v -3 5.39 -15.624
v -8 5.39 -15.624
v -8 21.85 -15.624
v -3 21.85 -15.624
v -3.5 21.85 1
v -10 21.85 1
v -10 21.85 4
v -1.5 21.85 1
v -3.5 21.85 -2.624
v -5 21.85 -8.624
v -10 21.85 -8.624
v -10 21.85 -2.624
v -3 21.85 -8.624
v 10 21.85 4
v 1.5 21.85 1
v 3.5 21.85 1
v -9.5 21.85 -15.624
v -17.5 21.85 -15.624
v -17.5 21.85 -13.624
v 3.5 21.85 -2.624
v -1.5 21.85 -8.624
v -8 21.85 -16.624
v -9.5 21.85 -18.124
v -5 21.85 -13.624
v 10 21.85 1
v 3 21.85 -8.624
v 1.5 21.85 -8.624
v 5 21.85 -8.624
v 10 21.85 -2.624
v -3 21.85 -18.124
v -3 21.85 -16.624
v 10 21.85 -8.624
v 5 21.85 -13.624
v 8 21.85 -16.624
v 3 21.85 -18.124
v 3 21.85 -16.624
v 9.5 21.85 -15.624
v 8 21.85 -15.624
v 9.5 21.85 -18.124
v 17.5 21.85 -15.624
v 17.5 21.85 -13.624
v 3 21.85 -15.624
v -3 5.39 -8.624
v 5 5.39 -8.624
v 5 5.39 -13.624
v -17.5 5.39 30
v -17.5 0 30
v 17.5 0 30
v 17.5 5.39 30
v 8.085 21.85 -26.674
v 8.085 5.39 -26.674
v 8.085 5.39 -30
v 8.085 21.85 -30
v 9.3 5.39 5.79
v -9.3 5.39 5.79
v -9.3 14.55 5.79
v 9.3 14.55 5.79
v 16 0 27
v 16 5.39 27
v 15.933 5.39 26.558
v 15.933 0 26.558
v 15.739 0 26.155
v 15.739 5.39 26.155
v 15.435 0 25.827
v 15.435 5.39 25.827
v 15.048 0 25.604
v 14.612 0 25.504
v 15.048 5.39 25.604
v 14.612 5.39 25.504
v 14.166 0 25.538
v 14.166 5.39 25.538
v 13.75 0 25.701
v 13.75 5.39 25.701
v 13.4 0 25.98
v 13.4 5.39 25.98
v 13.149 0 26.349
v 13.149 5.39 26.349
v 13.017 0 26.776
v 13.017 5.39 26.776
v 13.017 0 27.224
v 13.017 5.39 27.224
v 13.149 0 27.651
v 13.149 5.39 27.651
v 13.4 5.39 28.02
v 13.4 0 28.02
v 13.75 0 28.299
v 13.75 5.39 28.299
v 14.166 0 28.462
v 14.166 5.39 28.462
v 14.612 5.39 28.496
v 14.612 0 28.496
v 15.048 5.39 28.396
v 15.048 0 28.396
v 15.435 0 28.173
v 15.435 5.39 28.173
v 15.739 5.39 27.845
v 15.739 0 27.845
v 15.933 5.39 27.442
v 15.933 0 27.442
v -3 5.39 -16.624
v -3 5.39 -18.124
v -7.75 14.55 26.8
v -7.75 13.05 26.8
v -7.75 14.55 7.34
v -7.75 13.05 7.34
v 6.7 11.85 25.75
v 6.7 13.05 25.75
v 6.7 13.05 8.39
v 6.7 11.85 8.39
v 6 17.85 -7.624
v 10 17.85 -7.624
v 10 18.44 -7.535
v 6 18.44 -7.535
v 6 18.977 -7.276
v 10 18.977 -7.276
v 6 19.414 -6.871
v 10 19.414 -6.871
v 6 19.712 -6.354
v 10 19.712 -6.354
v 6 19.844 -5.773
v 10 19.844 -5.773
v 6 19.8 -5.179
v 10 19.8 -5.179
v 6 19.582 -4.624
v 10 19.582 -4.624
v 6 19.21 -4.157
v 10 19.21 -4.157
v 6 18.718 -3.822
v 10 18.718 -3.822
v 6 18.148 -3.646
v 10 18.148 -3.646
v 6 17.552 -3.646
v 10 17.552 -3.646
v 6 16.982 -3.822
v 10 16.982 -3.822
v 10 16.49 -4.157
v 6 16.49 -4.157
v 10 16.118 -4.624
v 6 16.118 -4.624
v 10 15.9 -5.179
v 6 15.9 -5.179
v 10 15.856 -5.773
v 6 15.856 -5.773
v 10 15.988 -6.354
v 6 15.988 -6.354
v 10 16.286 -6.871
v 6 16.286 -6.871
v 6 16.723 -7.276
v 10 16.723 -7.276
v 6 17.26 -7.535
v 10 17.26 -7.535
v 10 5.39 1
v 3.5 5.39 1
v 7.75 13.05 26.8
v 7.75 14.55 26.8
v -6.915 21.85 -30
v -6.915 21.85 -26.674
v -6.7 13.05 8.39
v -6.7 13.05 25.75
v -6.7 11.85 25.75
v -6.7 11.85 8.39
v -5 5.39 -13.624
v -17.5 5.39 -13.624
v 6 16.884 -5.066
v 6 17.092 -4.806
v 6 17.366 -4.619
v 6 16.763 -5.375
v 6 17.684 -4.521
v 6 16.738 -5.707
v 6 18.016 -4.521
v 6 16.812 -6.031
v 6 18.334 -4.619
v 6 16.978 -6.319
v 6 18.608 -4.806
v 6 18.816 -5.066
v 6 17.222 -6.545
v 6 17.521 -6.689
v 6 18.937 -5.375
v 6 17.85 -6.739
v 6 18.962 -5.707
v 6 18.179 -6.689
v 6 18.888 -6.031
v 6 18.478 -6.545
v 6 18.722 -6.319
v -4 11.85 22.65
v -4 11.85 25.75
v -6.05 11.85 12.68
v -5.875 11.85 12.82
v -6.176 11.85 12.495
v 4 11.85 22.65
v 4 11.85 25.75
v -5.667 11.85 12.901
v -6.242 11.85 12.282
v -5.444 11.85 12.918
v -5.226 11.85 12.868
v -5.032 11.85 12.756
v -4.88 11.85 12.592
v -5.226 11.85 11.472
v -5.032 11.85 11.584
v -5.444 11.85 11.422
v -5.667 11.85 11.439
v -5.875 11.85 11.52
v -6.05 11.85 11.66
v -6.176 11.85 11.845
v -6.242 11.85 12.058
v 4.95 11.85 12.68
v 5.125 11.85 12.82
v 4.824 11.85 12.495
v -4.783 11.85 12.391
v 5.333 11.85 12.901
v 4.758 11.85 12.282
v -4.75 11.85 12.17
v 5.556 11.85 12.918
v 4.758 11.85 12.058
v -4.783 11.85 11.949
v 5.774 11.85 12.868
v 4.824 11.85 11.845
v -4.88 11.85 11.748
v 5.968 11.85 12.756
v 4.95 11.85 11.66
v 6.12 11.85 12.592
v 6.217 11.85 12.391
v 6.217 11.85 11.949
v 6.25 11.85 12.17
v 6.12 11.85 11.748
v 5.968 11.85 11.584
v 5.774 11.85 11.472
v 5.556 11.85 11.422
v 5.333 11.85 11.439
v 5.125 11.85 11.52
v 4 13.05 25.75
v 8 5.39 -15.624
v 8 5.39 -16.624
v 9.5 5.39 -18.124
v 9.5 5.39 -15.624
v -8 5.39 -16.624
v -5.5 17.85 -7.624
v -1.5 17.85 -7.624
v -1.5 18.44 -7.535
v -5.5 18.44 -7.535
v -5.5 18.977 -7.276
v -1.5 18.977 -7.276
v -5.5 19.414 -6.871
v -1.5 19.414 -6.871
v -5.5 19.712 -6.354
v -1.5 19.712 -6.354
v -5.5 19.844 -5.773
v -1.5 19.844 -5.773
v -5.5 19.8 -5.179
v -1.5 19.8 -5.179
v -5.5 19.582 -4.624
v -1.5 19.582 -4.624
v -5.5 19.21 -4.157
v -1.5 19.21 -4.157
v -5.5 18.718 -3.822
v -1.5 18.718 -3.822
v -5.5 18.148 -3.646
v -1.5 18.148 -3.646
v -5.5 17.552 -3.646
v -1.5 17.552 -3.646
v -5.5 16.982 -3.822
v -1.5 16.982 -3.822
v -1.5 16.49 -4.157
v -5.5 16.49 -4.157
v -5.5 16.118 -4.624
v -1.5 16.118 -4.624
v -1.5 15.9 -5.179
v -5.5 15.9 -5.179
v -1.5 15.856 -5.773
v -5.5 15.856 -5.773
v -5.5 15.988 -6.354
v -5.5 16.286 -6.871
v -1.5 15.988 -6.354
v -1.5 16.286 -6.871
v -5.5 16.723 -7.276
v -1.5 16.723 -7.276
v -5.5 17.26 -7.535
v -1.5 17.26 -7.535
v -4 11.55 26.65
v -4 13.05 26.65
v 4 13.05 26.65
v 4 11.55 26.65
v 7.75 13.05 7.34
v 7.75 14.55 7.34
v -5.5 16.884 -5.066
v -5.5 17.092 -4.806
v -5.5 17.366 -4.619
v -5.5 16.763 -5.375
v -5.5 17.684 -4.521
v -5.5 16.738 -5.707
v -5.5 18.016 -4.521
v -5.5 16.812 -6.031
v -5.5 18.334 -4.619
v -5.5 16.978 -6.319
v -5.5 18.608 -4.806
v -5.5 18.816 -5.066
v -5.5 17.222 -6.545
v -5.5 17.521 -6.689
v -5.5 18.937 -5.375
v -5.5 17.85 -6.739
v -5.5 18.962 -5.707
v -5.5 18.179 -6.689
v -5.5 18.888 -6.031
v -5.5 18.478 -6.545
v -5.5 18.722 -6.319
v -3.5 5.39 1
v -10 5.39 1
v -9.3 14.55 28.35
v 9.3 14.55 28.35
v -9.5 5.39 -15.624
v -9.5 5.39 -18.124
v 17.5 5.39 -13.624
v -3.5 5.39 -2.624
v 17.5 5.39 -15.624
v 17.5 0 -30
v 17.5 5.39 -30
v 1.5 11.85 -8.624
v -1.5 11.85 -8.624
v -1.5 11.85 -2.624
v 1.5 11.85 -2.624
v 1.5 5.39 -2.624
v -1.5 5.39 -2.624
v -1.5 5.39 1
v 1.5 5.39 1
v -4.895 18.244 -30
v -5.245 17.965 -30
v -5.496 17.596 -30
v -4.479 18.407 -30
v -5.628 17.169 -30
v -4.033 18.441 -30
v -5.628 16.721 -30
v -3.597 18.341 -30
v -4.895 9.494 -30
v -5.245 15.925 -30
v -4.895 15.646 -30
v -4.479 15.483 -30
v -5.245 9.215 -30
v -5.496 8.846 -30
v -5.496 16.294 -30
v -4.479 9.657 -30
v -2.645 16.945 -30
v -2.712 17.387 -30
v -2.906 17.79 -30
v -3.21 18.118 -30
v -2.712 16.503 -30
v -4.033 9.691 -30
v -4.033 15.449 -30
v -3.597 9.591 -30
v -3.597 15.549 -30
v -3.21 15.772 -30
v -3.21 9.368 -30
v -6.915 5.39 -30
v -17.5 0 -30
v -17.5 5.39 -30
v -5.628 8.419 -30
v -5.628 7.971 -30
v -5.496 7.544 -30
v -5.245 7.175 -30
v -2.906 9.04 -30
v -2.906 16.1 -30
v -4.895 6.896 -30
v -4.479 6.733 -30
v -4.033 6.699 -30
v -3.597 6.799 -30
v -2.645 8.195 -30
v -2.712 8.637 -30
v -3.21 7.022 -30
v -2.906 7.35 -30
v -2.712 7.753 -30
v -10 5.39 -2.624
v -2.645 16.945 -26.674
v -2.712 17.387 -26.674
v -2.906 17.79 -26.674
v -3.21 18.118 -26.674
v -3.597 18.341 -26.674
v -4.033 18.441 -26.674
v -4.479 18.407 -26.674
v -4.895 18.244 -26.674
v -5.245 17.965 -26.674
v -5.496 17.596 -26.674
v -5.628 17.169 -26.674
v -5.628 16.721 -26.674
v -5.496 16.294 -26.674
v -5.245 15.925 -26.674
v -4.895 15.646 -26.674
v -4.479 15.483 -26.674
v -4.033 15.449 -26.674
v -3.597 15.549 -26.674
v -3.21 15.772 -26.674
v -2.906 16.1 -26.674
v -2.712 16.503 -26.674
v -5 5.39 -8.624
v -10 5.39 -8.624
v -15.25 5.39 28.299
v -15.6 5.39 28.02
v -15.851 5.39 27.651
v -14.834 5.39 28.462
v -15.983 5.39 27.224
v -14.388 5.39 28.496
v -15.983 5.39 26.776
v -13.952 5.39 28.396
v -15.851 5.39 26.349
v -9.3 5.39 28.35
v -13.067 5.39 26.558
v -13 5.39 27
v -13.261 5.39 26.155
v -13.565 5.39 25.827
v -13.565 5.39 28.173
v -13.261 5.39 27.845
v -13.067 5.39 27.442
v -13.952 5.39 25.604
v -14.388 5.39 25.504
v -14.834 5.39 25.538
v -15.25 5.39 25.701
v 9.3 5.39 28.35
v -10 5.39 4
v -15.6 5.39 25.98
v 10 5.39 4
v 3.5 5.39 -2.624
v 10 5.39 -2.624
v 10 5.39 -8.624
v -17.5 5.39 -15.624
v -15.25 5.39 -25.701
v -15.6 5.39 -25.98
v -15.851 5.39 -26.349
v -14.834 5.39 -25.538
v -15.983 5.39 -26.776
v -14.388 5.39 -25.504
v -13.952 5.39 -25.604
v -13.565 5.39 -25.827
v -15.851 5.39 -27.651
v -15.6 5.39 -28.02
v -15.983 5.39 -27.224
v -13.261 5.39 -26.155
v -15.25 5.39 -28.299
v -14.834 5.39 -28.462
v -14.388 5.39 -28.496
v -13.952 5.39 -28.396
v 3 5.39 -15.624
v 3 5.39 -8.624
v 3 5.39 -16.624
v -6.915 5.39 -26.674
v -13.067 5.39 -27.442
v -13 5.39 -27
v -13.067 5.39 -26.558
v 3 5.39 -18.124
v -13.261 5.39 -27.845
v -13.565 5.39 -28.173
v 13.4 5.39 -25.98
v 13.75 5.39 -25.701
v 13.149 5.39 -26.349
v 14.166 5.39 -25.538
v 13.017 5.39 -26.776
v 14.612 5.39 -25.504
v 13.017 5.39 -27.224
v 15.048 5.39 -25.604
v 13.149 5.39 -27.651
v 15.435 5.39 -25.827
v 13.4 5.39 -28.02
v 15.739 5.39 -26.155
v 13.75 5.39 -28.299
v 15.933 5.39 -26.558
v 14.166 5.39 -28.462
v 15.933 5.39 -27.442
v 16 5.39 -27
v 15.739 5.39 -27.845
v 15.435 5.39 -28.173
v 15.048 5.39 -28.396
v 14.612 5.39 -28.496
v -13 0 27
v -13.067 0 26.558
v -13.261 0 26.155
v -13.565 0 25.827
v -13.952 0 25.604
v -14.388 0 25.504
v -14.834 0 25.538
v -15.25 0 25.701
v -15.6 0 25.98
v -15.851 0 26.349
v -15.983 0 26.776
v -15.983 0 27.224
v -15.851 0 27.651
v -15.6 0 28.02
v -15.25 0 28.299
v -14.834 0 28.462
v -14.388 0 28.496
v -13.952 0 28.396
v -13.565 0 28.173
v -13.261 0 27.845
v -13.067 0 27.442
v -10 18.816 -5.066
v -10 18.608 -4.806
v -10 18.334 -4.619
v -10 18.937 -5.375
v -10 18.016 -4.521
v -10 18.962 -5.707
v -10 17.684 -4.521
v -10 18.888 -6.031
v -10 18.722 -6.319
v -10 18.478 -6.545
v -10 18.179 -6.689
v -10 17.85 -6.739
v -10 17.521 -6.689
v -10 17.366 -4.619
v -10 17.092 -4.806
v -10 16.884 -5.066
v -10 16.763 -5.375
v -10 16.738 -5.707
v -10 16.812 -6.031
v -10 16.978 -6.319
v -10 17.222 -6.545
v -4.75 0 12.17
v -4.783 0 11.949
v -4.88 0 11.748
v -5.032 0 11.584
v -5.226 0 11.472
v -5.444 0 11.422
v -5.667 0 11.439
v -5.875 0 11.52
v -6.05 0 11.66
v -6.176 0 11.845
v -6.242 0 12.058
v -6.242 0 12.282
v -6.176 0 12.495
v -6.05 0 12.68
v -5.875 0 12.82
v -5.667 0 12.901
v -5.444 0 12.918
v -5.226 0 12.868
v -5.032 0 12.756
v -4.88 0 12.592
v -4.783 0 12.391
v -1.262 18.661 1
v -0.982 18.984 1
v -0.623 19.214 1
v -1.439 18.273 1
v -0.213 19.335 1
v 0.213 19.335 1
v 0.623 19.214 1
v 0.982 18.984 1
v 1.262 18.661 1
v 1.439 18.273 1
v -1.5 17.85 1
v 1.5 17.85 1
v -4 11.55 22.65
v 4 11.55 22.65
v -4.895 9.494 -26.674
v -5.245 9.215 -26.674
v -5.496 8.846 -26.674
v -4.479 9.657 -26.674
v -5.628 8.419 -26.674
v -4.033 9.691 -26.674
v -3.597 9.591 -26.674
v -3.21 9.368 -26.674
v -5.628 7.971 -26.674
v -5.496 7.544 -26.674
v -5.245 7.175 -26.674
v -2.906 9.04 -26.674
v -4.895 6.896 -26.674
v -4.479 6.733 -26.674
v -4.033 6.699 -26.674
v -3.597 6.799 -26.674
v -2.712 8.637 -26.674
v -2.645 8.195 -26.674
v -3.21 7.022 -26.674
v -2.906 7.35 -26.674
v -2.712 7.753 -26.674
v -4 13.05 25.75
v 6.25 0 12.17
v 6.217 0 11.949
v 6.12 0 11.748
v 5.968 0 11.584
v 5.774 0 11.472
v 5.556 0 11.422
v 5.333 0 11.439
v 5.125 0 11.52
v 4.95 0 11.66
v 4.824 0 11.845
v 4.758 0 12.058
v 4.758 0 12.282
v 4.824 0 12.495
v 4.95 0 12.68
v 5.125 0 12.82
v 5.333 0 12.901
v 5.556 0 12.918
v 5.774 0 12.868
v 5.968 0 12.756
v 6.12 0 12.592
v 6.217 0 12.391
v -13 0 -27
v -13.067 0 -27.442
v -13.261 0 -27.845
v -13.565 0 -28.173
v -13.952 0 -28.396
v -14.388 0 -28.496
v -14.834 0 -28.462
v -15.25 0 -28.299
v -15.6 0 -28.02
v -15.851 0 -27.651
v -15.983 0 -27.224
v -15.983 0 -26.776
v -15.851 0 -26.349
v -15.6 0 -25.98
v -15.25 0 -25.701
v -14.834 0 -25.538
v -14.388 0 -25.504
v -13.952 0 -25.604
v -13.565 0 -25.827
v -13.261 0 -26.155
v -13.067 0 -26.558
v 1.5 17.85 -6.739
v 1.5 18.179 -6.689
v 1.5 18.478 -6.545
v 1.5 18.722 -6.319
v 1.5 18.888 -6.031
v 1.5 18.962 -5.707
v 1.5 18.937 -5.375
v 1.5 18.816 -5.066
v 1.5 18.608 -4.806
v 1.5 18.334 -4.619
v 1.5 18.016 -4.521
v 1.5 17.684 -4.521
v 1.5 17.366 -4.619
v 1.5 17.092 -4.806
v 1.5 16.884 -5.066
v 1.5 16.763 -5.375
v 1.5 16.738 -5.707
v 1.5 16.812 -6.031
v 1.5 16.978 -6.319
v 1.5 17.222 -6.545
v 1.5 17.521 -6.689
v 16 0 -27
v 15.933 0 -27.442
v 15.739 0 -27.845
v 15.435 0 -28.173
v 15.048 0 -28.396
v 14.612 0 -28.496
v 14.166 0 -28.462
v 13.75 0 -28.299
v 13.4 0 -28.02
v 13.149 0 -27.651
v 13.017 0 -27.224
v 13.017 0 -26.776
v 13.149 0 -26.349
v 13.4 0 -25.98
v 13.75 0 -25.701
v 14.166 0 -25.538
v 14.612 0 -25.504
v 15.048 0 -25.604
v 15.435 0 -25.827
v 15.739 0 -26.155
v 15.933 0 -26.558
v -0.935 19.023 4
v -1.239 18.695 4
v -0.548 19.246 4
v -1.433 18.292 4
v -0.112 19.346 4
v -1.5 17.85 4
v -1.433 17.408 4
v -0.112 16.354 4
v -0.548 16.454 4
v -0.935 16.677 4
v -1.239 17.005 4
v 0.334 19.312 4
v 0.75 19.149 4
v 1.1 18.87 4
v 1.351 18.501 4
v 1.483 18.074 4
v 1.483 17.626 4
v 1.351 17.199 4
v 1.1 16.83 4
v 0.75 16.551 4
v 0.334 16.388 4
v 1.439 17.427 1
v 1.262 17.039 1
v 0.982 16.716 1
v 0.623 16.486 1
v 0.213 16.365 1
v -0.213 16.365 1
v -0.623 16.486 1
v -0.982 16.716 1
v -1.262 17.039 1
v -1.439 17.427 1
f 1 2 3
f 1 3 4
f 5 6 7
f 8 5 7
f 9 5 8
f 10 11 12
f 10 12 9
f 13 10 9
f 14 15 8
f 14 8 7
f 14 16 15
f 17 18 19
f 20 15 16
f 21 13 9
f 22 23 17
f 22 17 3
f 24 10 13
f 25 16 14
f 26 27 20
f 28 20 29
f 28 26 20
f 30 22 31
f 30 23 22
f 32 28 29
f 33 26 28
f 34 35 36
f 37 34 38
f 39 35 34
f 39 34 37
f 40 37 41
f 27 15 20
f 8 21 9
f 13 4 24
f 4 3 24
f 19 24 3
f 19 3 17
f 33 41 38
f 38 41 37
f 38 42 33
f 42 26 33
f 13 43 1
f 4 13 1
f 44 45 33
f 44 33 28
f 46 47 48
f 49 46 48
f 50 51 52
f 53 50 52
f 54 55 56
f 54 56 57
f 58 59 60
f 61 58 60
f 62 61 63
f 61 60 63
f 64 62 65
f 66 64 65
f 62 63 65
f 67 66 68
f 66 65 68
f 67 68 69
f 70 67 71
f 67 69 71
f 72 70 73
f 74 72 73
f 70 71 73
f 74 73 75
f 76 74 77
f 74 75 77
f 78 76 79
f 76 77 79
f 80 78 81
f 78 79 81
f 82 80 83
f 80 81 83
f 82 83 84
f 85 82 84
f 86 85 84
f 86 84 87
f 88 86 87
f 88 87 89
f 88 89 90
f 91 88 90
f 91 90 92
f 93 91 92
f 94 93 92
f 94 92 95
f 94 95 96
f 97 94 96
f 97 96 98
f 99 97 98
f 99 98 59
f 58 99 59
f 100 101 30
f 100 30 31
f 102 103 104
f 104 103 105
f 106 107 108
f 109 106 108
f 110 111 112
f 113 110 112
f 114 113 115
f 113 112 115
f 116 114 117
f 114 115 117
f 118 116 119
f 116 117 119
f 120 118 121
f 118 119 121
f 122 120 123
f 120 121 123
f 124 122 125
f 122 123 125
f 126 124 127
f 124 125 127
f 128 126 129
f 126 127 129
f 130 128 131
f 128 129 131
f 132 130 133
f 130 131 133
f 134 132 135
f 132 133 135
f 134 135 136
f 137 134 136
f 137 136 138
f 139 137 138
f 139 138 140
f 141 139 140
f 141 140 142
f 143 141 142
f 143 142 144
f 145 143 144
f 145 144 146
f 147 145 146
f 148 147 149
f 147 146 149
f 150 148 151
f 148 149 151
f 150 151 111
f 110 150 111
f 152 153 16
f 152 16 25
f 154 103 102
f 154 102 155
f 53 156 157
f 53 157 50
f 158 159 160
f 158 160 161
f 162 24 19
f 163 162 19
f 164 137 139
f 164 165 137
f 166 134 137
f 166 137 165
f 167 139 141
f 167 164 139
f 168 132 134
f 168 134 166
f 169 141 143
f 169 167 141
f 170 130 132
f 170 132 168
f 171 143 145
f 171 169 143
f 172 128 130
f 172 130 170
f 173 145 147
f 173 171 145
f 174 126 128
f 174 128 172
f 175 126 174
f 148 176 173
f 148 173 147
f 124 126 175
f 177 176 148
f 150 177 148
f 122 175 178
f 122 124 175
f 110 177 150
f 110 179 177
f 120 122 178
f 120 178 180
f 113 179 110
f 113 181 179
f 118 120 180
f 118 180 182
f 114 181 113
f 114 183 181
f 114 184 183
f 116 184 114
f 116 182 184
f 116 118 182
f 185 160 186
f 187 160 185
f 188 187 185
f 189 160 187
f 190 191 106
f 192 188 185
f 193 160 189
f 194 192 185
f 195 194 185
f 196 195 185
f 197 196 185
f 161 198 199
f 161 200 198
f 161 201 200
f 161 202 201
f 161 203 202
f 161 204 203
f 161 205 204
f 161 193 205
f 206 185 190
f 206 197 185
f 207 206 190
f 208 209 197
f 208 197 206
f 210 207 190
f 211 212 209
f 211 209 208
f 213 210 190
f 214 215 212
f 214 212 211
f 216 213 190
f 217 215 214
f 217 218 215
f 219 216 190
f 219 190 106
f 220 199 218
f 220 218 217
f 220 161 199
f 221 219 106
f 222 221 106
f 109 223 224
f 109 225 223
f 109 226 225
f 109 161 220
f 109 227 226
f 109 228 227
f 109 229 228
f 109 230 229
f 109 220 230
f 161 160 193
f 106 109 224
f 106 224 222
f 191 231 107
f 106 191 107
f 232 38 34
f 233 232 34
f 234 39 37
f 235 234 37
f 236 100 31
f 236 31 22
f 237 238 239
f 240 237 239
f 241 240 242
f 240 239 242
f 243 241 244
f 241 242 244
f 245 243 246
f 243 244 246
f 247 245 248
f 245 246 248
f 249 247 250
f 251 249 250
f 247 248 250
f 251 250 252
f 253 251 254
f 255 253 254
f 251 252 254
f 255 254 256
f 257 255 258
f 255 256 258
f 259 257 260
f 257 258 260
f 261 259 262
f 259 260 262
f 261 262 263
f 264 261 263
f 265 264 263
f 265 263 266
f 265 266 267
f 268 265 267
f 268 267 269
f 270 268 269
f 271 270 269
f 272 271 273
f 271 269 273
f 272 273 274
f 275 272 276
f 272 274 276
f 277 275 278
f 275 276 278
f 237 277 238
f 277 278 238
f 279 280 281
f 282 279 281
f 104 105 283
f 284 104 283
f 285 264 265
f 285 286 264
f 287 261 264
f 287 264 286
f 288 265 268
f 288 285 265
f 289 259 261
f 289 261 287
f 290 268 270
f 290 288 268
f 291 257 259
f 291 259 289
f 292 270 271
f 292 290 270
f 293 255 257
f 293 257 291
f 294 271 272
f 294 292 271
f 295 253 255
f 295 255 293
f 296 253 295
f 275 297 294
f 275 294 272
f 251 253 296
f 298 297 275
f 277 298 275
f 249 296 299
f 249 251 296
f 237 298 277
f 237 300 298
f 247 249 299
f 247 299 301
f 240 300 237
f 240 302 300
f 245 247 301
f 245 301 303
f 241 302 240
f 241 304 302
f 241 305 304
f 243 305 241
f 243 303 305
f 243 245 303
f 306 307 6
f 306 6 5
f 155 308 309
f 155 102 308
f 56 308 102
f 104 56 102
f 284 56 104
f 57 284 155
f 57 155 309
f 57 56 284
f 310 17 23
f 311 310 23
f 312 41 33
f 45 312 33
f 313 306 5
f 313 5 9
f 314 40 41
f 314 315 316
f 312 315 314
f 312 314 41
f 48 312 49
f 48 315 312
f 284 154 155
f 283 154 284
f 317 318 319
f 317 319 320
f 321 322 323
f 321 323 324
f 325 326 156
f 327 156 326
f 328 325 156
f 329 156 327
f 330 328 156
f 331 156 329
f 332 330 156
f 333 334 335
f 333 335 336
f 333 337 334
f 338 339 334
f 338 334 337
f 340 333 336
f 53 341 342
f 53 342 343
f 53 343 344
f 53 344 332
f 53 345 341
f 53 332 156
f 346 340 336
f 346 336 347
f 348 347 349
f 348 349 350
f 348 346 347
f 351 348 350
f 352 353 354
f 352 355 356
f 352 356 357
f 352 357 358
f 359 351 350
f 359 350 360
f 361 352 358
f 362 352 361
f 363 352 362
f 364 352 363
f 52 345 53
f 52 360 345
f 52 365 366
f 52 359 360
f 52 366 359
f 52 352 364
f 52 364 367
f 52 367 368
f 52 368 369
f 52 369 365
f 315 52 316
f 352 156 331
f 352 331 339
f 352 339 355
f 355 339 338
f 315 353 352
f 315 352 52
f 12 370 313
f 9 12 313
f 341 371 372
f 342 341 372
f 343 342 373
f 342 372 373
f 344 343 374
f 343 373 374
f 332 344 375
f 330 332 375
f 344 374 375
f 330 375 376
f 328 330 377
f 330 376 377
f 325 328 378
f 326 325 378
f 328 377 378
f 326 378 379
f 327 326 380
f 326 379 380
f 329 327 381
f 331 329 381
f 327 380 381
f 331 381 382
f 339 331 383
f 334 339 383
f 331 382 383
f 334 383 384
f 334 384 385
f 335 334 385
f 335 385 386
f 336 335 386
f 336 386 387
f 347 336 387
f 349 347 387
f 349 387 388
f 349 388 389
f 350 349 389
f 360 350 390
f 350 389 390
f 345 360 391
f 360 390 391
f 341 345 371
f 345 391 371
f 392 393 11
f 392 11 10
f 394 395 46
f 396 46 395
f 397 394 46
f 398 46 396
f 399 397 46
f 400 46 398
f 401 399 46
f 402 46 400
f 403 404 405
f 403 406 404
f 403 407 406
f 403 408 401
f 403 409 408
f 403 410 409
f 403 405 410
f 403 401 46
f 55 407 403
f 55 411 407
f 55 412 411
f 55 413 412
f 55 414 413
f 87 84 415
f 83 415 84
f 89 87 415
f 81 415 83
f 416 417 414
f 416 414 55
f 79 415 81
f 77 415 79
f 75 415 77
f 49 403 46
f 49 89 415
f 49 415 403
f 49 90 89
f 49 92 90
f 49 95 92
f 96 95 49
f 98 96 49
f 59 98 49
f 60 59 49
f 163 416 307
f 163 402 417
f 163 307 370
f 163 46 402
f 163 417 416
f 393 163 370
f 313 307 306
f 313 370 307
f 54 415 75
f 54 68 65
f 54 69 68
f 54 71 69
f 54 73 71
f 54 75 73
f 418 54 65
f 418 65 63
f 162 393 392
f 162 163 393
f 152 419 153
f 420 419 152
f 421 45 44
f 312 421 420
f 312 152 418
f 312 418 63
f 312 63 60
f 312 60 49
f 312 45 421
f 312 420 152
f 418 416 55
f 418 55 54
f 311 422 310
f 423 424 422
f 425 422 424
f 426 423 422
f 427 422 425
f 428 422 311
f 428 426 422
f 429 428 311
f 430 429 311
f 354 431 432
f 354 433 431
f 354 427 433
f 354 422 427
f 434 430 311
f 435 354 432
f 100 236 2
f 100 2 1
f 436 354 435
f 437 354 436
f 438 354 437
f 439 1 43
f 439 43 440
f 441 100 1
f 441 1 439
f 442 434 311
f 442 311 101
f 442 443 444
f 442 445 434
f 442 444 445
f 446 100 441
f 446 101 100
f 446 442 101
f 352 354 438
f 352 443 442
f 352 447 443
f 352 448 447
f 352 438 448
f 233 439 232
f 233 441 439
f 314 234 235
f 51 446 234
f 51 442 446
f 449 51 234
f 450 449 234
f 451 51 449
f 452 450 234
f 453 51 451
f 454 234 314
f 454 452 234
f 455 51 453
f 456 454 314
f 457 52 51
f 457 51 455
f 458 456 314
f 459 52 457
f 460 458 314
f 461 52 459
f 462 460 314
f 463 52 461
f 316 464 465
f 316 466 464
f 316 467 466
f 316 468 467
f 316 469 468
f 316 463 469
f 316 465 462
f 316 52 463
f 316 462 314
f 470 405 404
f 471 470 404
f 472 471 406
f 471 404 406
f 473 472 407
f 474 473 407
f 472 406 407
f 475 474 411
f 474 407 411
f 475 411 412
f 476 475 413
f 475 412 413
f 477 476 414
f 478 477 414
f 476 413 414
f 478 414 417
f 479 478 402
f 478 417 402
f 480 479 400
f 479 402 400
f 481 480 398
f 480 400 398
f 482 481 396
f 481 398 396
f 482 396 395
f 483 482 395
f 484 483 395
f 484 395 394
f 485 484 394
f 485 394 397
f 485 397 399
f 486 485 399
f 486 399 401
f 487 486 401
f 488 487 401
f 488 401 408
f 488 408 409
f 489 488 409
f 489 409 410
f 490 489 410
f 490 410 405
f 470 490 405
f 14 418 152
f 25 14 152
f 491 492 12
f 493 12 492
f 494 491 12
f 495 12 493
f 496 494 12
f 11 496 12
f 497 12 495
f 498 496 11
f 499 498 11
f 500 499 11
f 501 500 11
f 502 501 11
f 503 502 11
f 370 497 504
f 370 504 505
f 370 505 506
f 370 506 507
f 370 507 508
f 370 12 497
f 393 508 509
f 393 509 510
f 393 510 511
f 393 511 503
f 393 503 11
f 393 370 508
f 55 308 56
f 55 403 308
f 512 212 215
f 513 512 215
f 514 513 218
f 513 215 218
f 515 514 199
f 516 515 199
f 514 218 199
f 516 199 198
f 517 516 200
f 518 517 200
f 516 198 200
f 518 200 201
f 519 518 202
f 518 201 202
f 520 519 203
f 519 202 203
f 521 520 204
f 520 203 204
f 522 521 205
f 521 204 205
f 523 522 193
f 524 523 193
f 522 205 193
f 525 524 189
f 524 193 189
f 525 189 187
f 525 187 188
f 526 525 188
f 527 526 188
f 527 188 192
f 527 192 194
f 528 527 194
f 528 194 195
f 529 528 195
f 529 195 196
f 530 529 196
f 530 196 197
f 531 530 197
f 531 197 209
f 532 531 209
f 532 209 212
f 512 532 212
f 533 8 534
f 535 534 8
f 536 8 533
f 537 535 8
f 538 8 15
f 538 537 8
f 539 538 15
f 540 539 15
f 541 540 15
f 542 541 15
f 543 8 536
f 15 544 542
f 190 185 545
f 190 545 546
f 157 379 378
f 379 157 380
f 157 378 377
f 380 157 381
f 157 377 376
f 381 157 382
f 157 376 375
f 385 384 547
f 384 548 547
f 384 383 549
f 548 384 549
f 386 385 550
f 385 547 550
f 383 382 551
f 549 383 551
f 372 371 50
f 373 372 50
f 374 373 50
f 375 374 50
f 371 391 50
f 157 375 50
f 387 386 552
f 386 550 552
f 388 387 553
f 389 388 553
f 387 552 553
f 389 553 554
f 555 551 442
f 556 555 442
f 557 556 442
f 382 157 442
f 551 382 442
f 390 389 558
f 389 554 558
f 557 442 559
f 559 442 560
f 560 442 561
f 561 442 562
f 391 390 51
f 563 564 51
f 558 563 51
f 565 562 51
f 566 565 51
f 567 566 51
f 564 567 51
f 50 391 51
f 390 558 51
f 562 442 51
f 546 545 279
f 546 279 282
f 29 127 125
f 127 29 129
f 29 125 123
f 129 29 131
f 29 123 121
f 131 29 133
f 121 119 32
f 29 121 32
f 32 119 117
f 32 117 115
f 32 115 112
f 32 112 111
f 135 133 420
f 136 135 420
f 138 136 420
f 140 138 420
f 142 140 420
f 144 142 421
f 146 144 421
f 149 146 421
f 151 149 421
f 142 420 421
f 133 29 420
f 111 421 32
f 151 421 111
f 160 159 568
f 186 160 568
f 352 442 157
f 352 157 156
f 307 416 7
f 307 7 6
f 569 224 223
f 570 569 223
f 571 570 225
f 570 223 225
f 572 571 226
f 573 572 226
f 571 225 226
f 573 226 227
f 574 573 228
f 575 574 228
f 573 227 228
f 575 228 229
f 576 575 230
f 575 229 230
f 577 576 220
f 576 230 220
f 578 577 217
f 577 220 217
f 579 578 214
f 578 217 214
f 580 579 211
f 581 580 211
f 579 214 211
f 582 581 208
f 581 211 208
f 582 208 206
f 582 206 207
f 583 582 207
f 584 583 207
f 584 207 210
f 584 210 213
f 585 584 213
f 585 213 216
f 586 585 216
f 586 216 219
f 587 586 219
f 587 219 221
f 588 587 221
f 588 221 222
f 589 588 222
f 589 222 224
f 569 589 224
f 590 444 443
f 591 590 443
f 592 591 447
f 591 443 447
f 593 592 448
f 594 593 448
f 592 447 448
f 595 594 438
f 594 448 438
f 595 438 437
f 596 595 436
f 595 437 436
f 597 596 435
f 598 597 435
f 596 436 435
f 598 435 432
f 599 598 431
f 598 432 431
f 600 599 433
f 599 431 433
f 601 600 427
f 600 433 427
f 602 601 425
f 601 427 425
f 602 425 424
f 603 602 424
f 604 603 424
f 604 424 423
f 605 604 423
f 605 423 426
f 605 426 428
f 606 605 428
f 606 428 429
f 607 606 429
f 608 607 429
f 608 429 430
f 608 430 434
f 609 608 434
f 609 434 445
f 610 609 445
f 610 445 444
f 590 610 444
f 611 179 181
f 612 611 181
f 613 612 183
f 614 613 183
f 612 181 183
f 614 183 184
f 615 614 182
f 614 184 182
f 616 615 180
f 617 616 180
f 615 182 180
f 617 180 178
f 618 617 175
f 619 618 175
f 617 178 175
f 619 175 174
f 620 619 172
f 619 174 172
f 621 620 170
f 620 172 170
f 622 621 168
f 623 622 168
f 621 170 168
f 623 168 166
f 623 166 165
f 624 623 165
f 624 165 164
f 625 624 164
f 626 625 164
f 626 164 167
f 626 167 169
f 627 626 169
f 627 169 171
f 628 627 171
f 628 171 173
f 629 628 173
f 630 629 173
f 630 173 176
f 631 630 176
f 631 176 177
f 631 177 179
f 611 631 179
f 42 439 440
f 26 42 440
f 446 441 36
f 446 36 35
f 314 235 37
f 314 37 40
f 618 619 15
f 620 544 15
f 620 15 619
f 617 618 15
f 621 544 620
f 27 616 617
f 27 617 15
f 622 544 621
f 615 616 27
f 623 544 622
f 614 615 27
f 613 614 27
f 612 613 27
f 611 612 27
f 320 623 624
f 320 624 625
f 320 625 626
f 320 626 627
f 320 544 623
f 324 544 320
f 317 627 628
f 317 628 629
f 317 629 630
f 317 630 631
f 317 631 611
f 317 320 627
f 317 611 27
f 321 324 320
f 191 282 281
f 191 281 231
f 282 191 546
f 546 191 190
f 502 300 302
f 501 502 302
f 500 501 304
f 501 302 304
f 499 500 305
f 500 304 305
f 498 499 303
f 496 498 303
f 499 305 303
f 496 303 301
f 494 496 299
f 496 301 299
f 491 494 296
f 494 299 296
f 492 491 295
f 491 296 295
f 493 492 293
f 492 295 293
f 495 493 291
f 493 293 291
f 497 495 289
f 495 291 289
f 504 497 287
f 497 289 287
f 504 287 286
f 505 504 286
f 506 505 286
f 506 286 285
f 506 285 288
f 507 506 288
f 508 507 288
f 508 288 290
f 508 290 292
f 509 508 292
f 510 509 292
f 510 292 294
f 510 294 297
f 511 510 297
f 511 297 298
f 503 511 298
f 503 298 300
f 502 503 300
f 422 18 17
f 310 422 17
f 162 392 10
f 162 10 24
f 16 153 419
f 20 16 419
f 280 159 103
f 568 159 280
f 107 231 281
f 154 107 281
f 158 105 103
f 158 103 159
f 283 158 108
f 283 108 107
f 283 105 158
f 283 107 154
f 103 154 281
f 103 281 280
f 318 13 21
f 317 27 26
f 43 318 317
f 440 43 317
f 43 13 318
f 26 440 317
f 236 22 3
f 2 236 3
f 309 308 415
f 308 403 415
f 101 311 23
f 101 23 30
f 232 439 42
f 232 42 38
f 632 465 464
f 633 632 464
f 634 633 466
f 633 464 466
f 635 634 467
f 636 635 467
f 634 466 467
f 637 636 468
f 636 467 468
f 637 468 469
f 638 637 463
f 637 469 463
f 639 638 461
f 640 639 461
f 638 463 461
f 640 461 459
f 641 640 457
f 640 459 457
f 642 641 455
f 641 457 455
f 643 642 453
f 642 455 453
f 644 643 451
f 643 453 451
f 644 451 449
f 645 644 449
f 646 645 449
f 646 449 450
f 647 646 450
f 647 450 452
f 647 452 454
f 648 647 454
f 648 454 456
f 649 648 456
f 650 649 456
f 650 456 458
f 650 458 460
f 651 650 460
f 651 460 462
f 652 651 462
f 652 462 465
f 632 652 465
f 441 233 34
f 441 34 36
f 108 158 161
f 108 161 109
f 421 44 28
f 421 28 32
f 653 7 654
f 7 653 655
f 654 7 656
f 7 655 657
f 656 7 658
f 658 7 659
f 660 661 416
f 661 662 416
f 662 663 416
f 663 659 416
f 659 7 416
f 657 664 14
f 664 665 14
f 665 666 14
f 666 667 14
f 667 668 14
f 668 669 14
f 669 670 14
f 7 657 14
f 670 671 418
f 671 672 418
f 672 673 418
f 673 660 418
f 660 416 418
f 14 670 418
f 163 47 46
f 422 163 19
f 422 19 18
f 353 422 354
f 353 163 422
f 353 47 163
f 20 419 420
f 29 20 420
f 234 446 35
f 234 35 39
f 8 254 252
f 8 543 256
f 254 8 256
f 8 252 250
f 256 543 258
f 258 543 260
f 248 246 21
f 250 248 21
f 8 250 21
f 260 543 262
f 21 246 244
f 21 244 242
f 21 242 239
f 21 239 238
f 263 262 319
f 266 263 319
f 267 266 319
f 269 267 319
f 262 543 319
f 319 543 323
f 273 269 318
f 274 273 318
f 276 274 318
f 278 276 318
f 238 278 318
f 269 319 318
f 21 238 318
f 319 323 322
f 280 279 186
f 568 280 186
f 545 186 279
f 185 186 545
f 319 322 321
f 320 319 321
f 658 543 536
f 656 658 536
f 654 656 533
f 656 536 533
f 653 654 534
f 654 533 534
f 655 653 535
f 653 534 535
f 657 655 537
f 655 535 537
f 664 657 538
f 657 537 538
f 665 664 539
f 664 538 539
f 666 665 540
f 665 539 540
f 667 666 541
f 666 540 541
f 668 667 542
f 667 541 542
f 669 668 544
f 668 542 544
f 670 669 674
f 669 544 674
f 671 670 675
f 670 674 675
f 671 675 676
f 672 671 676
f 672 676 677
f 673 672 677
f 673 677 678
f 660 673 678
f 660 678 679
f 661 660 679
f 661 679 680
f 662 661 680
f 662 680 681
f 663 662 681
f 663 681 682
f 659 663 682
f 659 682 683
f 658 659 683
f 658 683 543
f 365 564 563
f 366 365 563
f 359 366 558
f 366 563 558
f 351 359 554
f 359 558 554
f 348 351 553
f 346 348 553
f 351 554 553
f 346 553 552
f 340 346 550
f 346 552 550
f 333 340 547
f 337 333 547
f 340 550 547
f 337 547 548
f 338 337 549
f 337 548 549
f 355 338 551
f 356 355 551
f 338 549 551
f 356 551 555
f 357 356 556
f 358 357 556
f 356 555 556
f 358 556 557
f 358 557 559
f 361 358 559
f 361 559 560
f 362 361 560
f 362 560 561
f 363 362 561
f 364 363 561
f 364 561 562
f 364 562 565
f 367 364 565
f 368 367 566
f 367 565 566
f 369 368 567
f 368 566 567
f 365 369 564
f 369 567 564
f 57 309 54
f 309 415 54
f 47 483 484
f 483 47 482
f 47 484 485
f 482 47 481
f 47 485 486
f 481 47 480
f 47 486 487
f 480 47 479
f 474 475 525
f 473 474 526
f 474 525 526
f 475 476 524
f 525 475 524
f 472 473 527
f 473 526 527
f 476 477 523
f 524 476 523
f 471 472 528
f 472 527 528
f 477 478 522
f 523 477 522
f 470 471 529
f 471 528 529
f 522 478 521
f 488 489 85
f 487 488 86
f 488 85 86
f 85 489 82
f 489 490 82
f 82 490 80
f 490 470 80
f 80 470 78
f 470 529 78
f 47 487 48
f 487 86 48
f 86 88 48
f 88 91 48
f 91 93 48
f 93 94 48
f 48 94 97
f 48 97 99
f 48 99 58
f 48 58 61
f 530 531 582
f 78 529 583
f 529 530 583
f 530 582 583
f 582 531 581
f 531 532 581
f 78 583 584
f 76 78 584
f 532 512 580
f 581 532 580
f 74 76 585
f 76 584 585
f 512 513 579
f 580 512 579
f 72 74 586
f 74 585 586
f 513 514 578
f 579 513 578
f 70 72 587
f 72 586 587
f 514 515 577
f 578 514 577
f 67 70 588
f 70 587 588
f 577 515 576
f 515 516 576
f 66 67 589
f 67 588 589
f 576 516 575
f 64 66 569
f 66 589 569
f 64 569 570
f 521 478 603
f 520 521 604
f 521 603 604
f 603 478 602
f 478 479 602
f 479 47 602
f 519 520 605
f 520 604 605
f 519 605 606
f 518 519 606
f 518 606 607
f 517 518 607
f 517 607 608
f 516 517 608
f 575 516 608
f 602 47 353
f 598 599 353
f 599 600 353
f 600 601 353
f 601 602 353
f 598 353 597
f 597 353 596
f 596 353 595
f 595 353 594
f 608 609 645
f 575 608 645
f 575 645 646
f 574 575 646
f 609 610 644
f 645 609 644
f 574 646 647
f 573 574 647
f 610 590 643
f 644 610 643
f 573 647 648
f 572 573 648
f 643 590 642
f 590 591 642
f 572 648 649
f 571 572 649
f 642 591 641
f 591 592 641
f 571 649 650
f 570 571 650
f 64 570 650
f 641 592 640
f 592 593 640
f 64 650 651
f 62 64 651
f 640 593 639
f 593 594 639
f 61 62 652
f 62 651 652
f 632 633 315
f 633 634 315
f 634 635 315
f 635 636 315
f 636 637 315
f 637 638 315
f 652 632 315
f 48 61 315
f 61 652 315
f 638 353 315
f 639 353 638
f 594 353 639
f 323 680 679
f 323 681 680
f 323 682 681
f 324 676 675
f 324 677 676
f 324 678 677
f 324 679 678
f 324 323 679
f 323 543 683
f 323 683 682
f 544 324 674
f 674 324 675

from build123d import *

# Parameters (mm, degrees)
SKETCH1_W                      = 35
SKETCH1_H                      = 60
FLATBASE_DEPTH                 = 5.39
SKETCH19_R                     = 1.5
FLATBASEHOLES_DEPTH            = 6.39
SKETCH2_W                      = 20
SKETCH2_H                      = 3
FILAMENT_LASER_INTERFACE_DEPTH = 16.46
SKETCH4_R                      = 1.5
LASERHOLE_DEPTH                = 3
SKETCH8_W                      = 18.6
SKETCH8_H                      = 22.56
LASER_BASE_DEPTH               = 7.66
SKETCH9_W                      = 13.4
SKETCH9_H                      = 17.36
LASERBOARDMAINCUT_DEPTH        = 1.2
SKETCH11_W                     = 8
SKETCH11_H                     = 4
LASERBOARD_PINHPLES_DEPTH      = 1.5
SKETCH13_W                     = 18.6
SKETCH13_H                     = 22.56
SKETCH13_W_2                   = 15.5
SKETCH13_H_2                   = 19.46
LASERBOARD_SKIRTING_DEPTH      = 1.5
SKETCH14_R                     = 0.75
LASERBOARD_SCREWHOLES_DEPTH    = 12.85
SKETCH20_W                     = 20
SKETCH20_H                     = 6
BOSS_EXTRUDE1_DEPTH            = 16.46
SKETCH22_R                     = 1.115
CUT_EXTRUDE1_DEPTH             = 20
SKETCH23_W                     = 3
SKETCH23_H                     = 6
CUT_EXTRUDE2_DEPTH             = 10
SKETCH24_R                     = 2
CUT_EXTRUDE3_DEPTH             = 4
SKETCH25_R                     = 2
CUT_EXTRUDE4_DEPTH             = 4
SKETCH26_W                     = 2
SKETCH26_H                     = 3.623584384
BOSS_EXTRUDE2_DEPTH            = 16.46
SKETCH27_W                     = 15
SKETCH27_H                     = 3.326415616
BOSS_EXTRUDE3_DEPTH            = 16.46
SKETCH28_R                     = 1.5
CUT_EXTRUDE5_DEPTH             = 3.326416
BOSS_EXTRUDE4_DEPTH            = 16.46


with BuildPart() as part:
    # Sketch1 → FlatBase (new body)
    with BuildSketch(Plane(origin=(0, 0, 0), x_dir=(1, 0, 0), z_dir=(0, 1, 0))):
        Rectangle(SKETCH1_W, SKETCH1_H)
    extrude(amount=FLATBASE_DEPTH)

    # Sketch19 → FlatBaseHoles (cut, through all)
    with BuildSketch(Plane(origin=(0, 5.39, 0), x_dir=(1, 0, 0), z_dir=(0, 1, 0))):
        with Locations((-14.5, 27)):
            Circle(SKETCH19_R)
        with Locations((14.5, 27)):
            Circle(SKETCH19_R)
        with Locations((14.5, -27)):
            Circle(SKETCH19_R)
        with Locations((-14.5, -27)):
            Circle(SKETCH19_R)
    extrude(amount=-FLATBASEHOLES_DEPTH, mode=Mode.SUBTRACT)

    # Sketch2 → Filament-Laser-Interface (add)
    with BuildSketch(Plane(origin=(0, 5.39, 0), x_dir=(1, 0, 0), z_dir=(0, 1, 0))):
        with Locations((0, -2.5)):
            Rectangle(SKETCH2_W, SKETCH2_H)
    extrude(amount=FILAMENT_LASER_INTERFACE_DEPTH)

    # Sketch4 → LaserHole (cut)
    with BuildSketch(Plane(origin=(0, 0, 1), x_dir=(-1, 0, 0), z_dir=(0, 0, -1))):
        with Locations((0, 17.85)):
            Circle(SKETCH4_R)
    extrude(amount=-LASERHOLE_DEPTH, mode=Mode.SUBTRACT)

    # Sketch8 → Laser-Base (add)
    with BuildSketch(Plane(origin=(0, 5.39, 0), x_dir=(1, 0, 0), z_dir=(0, 1, 0))):
        with Locations((0, -17.07)):
            Rectangle(SKETCH8_W, SKETCH8_H)
    extrude(amount=LASER_BASE_DEPTH)

    # Sketch9 → LaserBoardMainCut (cut)
    with BuildSketch(Plane(origin=(0, 13.05, 0), x_dir=(1, 0, 0), z_dir=(0, 1, 0))):
        with Locations((0, -17.07)):
            Rectangle(SKETCH9_W, SKETCH9_H)
    extrude(amount=-LASERBOARDMAINCUT_DEPTH, mode=Mode.SUBTRACT)

    # Sketch11 → LaserBoard-PinHples (cut)
    with BuildSketch(Plane(origin=(0, 13.05, 0), x_dir=(1, 0, 0), z_dir=(0, 1, 0))):
        with Locations((0, -24.65)):
            Rectangle(SKETCH11_W, SKETCH11_H)
    extrude(amount=-LASERBOARD_PINHPLES_DEPTH, mode=Mode.SUBTRACT)

    # Sketch13 → LaserBoard-Skirting (add)
    with BuildSketch(Plane(origin=(0, 13.05, 0), x_dir=(1, 0, 0), z_dir=(0, 1, 0))):
        with Locations((0, -17.07)):
            Rectangle(SKETCH13_W, SKETCH13_H)
        with Locations((0, -17.07)):
            Rectangle(SKETCH13_W_2, SKETCH13_H_2, mode=Mode.SUBTRACT)
    extrude(amount=LASERBOARD_SKIRTING_DEPTH)

    # Sketch14 → LaserBoard-ScrewHoles (cut, through all)
    with BuildSketch(Plane(origin=(0, 11.85, 0), x_dir=(1, 0, 0), z_dir=(0, 1, 0))):
        with Locations((5.5, -12.17)):
            Circle(SKETCH14_R)
        with Locations((-5.5, -12.17)):
            Circle(SKETCH14_R)
    extrude(amount=-LASERBOARD_SCREWHOLES_DEPTH, mode=Mode.SUBTRACT)

    # Sketch20 → Boss-Extrude1 (add)
    with BuildSketch(Plane(origin=(0, 5.39, 0), x_dir=(1, 0, 0), z_dir=(0, 1, 0))):
        with Locations((0, 5.623584384)):
            Rectangle(SKETCH20_W, SKETCH20_H)
    extrude(amount=BOSS_EXTRUDE1_DEPTH)

    # Sketch22 → Cut-Extrude1 (cut)
    with BuildSketch(Plane(origin=(10, 0, 0), x_dir=(0, 0, -1), z_dir=(1, 0, 0))):
        with Locations((5.623584384, 17.85)):
            Circle(SKETCH22_R)
    extrude(amount=-CUT_EXTRUDE1_DEPTH, mode=Mode.SUBTRACT)

    # Sketch23 → Cut-Extrude2 (cut)
    with BuildSketch(Plane(origin=(0, 21.85, 0), x_dir=(1, 0, 0), z_dir=(0, 1, 0))):
        with Locations((0, 5.623584384)):
            Rectangle(SKETCH23_W, SKETCH23_H)
    extrude(amount=-CUT_EXTRUDE2_DEPTH, mode=Mode.SUBTRACT)

    # Sketch24 → Cut-Extrude3 (cut)
    with BuildSketch(Plane(origin=(10, 0, 0), x_dir=(0, 0, -1), z_dir=(1, 0, 0))):
        with Locations((5.623584384, 17.85)):
            Circle(SKETCH24_R)
    extrude(amount=-CUT_EXTRUDE3_DEPTH, mode=Mode.SUBTRACT)

    # Sketch25 → Cut-Extrude4 (cut)
    with BuildSketch(Plane(origin=(-1.5, 0, 0), x_dir=(0, 0, -1), z_dir=(1, 0, 0))):
        with Locations((5.623584384, 17.85)):
            Circle(SKETCH25_R)
    extrude(amount=-CUT_EXTRUDE4_DEPTH, mode=Mode.SUBTRACT)

    # Sketch26 → Boss-Extrude2 (add)
    with BuildSketch(Plane(origin=(0, 5.39, 0), x_dir=(1, 0, 0), z_dir=(0, 1, 0))):
        with Locations((2.5, 0.811792192)):
            Rectangle(SKETCH26_W, SKETCH26_H)
        with Locations((-2.5, 0.811792192)):
            Rectangle(SKETCH26_W, SKETCH26_H)
    extrude(amount=BOSS_EXTRUDE2_DEPTH)

    # Sketch27 → Boss-Extrude3 (add)
    with BuildSketch(Plane(origin=(0, 5.39, 0), x_dir=(1, 0, 0), z_dir=(0, 1, 0))):
        with Locations((0.585, 28.336792192)):
            Rectangle(SKETCH27_W, SKETCH27_H)
    extrude(amount=BOSS_EXTRUDE3_DEPTH)

    # Sketch28 → Cut-Extrude5 (cut)
    with BuildSketch(Plane.XY.offset(-26.673584384)):
        with Locations((-4.145, 8.195)):
            Circle(SKETCH28_R)
        with Locations((-4.145, 16.945)):
            Circle(SKETCH28_R)
    extrude(amount=-CUT_EXTRUDE5_DEPTH, mode=Mode.SUBTRACT)

    # Sketch29 → Boss-Extrude4 (add)
    with BuildSketch(Plane(origin=(0, 5.39, 0), x_dir=(1, 0, 0), z_dir=(0, 1, 0))):
        Polygon((-17.5, 15.623584384), (-9.5, 15.623584384), (-9.5, 18.123584384), (-3, 18.123584384), (-3, 16.623584384), (-8, 16.623584384), (-8, 15.623584384), (-3, 15.623584384), (-3, 13.623584384), (-3, 8.623584384), (-5, 8.623584384), (-5, 13.623584384), (-17.5, 13.623584384), align=None)
        Polygon((17.5, 15.623584384), (17.5, 13.623584384), (5, 13.623584384), (5, 8.623584384), (3, 8.623584384), (3, 13.623584384), (3, 15.623584384), (8, 15.623584384), (8, 16.623584384), (3, 16.623584384), (3, 18.123584384), (9.5, 18.123584384), (9.5, 15.623584384), align=None)
    extrude(amount=BOSS_EXTRUDE4_DEPTH)


solid = part.part
